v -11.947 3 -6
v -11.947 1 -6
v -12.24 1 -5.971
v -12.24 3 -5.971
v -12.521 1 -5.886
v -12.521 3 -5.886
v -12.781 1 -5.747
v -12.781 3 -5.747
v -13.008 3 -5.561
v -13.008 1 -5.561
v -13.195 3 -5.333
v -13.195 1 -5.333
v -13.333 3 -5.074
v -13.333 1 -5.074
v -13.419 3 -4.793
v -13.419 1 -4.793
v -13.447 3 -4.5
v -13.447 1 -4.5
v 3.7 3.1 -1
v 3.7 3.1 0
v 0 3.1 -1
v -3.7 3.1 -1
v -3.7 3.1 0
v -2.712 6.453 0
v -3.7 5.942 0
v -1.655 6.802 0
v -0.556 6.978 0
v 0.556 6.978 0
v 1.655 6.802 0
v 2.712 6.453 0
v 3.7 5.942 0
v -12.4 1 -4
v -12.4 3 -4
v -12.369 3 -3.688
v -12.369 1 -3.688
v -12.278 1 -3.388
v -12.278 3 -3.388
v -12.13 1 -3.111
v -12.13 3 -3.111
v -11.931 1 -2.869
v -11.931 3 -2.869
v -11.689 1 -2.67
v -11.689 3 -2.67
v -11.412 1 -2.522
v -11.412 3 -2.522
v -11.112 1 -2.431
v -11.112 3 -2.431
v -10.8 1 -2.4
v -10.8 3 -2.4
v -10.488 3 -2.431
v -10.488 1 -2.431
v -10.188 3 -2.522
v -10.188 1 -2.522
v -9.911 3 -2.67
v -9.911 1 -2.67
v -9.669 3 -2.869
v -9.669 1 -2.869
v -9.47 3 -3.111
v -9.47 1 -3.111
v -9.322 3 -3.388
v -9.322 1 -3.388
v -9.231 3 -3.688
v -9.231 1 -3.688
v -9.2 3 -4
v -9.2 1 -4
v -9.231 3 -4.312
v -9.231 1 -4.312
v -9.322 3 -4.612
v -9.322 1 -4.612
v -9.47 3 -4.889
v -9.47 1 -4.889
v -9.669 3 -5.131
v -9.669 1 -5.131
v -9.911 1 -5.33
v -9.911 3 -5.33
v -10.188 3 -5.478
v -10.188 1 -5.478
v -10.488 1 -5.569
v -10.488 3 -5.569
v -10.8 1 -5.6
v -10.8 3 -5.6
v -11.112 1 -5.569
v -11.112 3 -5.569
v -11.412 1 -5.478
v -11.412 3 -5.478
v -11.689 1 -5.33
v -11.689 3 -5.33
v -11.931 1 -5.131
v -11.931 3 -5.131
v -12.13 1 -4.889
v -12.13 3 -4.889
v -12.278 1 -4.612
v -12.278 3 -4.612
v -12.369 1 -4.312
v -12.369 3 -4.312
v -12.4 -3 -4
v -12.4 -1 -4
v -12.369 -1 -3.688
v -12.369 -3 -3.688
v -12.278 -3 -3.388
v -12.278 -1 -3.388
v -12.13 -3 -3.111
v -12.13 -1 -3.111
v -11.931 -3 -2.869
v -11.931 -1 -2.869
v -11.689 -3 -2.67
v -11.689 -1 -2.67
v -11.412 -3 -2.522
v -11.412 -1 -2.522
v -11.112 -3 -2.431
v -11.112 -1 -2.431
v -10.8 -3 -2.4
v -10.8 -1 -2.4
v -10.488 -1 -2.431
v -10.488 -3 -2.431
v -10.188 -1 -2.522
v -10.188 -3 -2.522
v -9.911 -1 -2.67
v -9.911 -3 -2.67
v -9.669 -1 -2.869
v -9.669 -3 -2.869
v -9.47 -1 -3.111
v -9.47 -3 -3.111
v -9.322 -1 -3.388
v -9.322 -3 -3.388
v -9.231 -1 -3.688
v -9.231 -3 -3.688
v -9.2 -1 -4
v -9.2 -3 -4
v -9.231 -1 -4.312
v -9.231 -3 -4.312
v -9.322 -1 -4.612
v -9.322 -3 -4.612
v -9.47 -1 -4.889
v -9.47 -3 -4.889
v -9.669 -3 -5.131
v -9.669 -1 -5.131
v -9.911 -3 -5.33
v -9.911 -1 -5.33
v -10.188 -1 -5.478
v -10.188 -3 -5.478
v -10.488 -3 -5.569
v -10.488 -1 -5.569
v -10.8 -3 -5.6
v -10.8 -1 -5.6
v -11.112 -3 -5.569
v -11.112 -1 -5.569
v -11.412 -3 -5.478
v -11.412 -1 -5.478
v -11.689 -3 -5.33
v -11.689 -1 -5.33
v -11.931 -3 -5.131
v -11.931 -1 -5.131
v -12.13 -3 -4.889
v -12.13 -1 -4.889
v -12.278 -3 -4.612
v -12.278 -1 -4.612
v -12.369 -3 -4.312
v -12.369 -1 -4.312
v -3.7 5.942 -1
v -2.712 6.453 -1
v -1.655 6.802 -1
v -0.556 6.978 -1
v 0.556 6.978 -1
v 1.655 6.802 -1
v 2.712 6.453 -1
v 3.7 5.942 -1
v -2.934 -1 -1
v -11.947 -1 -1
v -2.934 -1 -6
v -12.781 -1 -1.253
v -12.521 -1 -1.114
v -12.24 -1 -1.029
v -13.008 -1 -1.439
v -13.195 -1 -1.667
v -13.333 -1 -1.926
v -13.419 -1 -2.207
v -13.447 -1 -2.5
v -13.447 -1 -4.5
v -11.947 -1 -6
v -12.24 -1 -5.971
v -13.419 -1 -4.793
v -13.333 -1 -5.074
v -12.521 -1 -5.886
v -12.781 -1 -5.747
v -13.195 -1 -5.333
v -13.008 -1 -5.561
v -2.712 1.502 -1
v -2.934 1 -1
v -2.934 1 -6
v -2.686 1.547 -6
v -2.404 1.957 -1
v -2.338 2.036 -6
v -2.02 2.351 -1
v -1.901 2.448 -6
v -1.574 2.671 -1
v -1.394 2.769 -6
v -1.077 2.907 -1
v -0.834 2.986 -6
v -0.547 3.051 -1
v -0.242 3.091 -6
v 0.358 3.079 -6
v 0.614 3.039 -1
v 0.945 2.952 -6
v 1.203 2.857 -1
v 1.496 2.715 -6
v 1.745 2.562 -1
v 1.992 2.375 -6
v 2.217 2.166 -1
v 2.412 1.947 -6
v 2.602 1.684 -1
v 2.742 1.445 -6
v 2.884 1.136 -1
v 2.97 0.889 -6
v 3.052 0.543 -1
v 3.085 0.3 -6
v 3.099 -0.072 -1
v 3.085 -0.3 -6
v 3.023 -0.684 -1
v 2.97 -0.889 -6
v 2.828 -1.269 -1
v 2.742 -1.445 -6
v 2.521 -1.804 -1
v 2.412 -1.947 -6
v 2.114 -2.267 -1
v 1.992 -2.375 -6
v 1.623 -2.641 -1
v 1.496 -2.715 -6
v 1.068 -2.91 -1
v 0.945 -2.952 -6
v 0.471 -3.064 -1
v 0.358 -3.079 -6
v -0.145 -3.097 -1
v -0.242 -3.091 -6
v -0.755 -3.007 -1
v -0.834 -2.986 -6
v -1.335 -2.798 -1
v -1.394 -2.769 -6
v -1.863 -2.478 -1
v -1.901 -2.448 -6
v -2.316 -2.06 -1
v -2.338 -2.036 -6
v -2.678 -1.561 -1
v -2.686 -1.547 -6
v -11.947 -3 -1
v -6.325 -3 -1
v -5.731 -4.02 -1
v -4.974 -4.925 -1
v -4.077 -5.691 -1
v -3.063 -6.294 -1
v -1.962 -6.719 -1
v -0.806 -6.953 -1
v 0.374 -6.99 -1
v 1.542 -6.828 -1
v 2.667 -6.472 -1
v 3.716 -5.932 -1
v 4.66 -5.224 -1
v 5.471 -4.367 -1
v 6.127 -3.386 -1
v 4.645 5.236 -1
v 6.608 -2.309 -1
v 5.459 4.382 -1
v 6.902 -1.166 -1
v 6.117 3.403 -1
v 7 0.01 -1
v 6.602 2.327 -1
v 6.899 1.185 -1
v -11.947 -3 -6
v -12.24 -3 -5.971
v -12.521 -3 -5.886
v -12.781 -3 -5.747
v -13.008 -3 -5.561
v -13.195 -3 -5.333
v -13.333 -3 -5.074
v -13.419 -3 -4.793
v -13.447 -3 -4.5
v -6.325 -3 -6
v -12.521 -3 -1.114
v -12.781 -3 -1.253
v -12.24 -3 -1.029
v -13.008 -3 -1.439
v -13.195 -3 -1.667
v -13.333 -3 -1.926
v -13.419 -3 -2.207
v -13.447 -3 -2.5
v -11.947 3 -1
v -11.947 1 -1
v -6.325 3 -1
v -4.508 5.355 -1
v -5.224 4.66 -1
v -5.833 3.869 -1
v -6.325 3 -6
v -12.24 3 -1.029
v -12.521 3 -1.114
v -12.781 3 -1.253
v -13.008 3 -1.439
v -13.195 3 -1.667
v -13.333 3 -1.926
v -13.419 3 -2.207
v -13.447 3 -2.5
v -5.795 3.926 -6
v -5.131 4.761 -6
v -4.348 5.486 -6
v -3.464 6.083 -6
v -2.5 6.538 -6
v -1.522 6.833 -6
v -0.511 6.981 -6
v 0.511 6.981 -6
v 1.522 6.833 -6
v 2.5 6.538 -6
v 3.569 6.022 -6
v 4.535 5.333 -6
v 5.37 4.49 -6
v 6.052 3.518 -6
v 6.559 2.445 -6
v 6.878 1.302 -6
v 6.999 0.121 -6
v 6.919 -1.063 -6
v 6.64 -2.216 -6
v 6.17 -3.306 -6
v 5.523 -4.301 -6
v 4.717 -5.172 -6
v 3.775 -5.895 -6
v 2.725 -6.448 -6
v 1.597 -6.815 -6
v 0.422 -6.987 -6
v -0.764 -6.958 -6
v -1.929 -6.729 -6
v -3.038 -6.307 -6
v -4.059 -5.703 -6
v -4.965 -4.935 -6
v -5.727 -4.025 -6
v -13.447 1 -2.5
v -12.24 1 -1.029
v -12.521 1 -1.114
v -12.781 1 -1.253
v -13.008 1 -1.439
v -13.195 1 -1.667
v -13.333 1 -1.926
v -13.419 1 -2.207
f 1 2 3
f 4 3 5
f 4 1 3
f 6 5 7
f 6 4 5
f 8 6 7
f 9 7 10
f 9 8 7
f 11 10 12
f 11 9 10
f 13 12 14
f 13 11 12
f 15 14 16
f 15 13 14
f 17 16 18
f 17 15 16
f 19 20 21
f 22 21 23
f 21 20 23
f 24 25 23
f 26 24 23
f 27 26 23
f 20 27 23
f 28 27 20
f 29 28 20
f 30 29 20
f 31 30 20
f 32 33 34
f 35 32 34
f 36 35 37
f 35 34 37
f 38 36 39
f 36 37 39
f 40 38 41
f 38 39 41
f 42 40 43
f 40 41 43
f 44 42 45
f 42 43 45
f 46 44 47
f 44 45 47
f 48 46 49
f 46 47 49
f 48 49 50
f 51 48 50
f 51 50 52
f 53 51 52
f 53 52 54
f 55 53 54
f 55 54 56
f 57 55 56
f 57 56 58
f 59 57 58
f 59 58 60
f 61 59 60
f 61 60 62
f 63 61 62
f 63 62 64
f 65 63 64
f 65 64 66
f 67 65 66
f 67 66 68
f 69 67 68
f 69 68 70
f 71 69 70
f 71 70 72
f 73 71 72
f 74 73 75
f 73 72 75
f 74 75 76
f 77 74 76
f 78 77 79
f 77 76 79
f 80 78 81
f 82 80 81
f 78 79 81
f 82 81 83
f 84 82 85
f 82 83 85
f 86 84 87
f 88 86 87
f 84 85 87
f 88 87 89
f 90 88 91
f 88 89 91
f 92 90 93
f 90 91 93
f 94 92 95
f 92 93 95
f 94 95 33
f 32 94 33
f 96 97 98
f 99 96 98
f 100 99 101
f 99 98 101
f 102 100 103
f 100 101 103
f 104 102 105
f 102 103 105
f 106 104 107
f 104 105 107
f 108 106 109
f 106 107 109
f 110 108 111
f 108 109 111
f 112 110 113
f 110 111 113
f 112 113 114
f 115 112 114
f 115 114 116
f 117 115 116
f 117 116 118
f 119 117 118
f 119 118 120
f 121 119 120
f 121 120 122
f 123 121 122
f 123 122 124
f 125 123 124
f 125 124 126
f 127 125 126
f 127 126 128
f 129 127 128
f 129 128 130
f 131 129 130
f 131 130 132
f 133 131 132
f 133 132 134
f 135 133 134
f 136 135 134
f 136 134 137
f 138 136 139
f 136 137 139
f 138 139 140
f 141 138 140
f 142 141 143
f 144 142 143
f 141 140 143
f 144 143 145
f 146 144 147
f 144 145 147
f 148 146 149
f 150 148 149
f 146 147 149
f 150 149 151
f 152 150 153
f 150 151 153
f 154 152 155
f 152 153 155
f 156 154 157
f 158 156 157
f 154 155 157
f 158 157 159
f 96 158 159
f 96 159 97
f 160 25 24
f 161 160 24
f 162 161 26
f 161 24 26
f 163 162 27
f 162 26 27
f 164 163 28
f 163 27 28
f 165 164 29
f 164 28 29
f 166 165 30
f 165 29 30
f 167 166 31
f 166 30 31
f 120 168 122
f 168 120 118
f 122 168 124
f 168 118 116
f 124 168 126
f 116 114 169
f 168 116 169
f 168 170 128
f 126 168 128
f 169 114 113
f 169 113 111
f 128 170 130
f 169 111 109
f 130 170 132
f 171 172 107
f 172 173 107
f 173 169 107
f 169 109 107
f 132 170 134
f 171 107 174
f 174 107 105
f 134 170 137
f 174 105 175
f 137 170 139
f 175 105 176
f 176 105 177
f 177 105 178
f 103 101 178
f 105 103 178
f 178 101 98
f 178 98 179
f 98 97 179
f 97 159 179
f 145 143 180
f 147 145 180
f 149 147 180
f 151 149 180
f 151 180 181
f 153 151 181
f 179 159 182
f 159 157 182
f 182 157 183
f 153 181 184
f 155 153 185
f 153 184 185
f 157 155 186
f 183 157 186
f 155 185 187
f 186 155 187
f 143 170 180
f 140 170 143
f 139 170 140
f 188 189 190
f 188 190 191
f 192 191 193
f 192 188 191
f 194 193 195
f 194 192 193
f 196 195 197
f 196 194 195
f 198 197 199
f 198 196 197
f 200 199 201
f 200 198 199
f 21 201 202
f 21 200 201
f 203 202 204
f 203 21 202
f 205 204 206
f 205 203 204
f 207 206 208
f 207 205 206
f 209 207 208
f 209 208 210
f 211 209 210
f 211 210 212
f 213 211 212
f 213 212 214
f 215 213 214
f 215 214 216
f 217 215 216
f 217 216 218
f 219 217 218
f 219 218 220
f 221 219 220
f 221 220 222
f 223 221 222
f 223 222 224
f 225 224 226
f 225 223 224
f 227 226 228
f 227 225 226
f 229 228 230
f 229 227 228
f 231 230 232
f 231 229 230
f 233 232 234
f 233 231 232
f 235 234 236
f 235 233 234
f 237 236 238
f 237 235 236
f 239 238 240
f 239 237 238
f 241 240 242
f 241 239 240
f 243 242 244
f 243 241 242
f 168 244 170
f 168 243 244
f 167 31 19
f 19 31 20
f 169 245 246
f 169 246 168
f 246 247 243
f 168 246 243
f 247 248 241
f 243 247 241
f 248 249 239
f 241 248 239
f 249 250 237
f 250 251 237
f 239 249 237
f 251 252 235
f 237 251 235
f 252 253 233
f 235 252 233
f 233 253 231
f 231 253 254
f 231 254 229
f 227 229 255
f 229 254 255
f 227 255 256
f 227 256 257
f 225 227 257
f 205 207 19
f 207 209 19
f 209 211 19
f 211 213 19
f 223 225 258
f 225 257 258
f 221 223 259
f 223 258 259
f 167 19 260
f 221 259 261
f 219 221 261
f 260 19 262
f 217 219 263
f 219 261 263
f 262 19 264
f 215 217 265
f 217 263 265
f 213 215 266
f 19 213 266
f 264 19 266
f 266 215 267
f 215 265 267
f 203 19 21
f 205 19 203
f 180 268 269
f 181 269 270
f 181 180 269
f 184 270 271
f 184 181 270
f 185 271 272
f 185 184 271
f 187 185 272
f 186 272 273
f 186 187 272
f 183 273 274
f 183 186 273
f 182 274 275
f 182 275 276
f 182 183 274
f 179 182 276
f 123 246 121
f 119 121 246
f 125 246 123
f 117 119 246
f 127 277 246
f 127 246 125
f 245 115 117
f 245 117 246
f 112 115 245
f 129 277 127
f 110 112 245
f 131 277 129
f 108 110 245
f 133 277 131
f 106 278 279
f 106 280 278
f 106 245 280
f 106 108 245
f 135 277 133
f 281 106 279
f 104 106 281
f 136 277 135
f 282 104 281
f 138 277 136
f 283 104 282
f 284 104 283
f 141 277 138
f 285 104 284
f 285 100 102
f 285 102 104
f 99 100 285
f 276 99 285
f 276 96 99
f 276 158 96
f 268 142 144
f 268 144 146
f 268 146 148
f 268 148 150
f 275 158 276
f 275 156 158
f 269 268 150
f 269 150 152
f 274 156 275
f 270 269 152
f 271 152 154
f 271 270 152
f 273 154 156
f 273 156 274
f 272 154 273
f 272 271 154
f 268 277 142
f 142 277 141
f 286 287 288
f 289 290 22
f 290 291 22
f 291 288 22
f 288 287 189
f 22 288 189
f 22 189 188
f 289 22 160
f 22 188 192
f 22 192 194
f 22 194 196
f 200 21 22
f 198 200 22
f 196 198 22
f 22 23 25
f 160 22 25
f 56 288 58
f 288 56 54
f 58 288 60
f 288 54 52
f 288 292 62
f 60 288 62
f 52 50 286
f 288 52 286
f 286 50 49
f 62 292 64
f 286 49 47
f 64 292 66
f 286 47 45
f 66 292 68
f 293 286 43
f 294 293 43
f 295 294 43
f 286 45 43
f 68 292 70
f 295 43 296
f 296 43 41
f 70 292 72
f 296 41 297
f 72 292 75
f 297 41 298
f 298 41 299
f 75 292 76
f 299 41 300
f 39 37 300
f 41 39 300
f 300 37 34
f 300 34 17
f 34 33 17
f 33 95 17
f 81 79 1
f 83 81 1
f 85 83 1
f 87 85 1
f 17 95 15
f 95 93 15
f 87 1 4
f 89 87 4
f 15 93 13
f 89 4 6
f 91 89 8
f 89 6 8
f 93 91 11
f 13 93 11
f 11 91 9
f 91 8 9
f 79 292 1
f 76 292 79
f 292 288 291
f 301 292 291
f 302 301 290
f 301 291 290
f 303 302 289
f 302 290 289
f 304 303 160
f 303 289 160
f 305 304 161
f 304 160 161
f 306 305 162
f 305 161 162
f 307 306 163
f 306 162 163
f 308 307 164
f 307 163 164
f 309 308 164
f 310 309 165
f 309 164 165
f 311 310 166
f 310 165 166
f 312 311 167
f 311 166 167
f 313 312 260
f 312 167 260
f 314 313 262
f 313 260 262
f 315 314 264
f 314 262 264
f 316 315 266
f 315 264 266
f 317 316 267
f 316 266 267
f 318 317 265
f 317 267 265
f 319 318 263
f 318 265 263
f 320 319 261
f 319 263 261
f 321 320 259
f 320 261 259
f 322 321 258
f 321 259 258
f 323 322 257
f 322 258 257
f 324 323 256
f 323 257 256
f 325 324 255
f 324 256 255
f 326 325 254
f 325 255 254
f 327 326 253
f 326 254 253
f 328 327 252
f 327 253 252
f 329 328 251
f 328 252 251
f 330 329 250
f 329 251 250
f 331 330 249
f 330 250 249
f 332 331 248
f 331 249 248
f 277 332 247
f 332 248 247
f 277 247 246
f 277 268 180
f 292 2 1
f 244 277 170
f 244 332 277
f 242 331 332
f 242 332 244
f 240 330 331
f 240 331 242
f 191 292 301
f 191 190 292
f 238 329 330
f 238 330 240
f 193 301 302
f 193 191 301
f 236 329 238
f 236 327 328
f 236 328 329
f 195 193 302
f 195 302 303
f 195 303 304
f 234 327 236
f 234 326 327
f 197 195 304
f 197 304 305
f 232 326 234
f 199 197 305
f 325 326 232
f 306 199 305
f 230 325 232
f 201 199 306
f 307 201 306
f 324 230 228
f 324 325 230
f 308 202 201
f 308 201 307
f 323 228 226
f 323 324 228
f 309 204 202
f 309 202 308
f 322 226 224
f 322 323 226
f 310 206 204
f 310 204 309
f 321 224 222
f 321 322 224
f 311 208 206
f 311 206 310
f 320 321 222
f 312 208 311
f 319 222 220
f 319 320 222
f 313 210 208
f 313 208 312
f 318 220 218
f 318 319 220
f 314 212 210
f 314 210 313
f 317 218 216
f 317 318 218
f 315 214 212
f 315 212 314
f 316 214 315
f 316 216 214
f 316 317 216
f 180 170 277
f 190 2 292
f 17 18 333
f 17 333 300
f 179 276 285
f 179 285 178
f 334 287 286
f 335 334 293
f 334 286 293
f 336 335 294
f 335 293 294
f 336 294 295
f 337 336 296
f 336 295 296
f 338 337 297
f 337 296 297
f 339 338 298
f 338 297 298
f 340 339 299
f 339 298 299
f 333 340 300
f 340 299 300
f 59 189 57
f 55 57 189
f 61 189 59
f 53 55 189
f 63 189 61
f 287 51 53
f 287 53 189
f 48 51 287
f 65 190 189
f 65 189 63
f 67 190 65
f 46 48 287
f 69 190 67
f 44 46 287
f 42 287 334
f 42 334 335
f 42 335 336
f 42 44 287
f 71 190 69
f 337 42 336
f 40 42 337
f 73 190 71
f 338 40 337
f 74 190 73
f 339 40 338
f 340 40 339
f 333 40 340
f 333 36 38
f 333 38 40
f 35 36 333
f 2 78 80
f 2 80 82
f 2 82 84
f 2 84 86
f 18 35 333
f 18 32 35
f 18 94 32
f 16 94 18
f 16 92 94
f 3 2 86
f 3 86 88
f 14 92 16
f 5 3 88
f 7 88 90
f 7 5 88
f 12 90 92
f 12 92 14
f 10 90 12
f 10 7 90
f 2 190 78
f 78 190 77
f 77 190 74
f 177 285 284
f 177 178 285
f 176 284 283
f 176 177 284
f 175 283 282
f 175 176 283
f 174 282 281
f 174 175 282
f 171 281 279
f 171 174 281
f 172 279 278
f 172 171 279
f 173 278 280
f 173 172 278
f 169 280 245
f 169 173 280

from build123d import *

# Parameters (mm, degrees)
SKETCH_1_R          = 14
SKETCH_1_R_2        = 1.5
EXTRUDE_1_DEPTH     = 2
CUT_EXTRUDE_1_DEPTH = 20.899748742
EXTRUDE_4_DEPTH     = 1
SKETCH_6_R          = 7
SKETCH_6_R_2        = 3.1
EXTRUDE_5_DEPTH     = 5
EXTRUDE_6_DEPTH     = 1
SKETCH_8_W          = 8
SKETCH_8_H          = 2
EXTRUDE_7_DEPTH     = 5
SKETCH_9_R          = 1.6
CUT_EXTRUDE_3_DEPTH = 24.108440017
EXTRUDE_8_DEPTH     = 2
SKETCH_11_W         = 12.041493288
SKETCH_11_H         = 2
CUT_EXTRUDE_4_DEPTH = 5
SKETCH_12_R         = 20
SKETCH_12_R_2       = 3.1
EXTRUDE_9_DEPTH     = 2
SKETCH_13_R         = 2.3
CUT_EXTRUDE_5_DEPTH = 2
CUT_EXTRUDE_START   = -1
CUT_EXTRUDE_6_DEPTH = 1
FILLET_1_R          = 3
FILLET_2_R          = 1.5
SKETCH_15_R         = 20
CUT_EXTRUDE_7_DEPTH = 2
SKETCH_16_R         = 7
CUT_EXTRUDE_8_DEPTH = 5


with BuildPart() as part:
    # 草图1 → 凸台-拉伸1 (new body)
    with BuildSketch(Plane.XY):
        Circle(SKETCH_1_R)
        with Locations((-7.071067812, 7.071067812)):
            Circle(SKETCH_1_R_2, mode=Mode.SUBTRACT)
        with Locations((7.071067812, 7.071067812)):
            Circle(SKETCH_1_R_2, mode=Mode.SUBTRACT)
        with Locations((-7.071067812, -7.071067812)):
            Circle(SKETCH_1_R_2, mode=Mode.SUBTRACT)
        with Locations((7.071067812, -7.071067812)):
            Circle(SKETCH_1_R_2, mode=Mode.SUBTRACT)
    extrude(amount=EXTRUDE_1_DEPTH)

    # 草图2 → 切除-拉伸1 (cut, through all)
    with BuildSketch(Plane(origin=(0, 0, 0), x_dir=(-1, 0, 0), z_dir=(0, 0, -1))):
        with BuildLine():
            ThreePointArc((-2.683281573, 3.1), (-4.1, 0), (-2.683281573, -3.1))
            Line((-2.683281573, -3.1), (2.683281573, -3.1))
            ThreePointArc((2.683281573, -3.1), (4.1, 0), (2.683281573, 3.1))
            Line((2.683281573, 3.1), (-2.683281573, 3.1))
        make_face()
    extrude(amount=-CUT_EXTRUDE_1_DEPTH, mode=Mode.SUBTRACT)

    # 草图3 → 凸台-拉伸4 (add)
    with BuildSketch(Plane(origin=(0, 0, 0), x_dir=(-1, 0, 0), z_dir=(0, 0, -1))):
        Polygon((0, 3.1), (3.7, 3.1), (3.7, 7.1), (-3.7, 7.1), (-3.7, 3.1), align=None)
    extrude(amount=EXTRUDE_4_DEPTH)

    # 草图6 → 凸台-拉伸5 (add)
    with BuildSketch(Plane(origin=(0, 0, -1), x_dir=(-1, 0, 0), z_dir=(0, 0, -1))):
        with Locations(Location((0, 0, 0), (0, 0, 121.908982735))):
            Circle(SKETCH_6_R)
        with Locations(Location((0, 0, 0), (0, 0, 90))):
            Circle(SKETCH_6_R_2, mode=Mode.SUBTRACT)
    extrude(amount=EXTRUDE_5_DEPTH)

    # 草图7 → 凸台-拉伸6 (add)
    with BuildSketch(Plane(origin=(0, 0, -6), x_dir=(-1, 0, 0), z_dir=(0, 0, -1))):
        with BuildLine():
            Line((-2.5, 3.1), (-2.5, 6.538348415))
            ThreePointArc((-2.5, 6.538348415), (0, 7), (2.5, 6.538348415))
            Line((2.5, 6.538348415), (2.5, 3.1))
            Line((2.5, 3.1), (-2.5, 3.1))
        make_face()
    extrude(amount=EXTRUDE_6_DEPTH)

    # 草图8 → 凸台-拉伸7 (add)
    with BuildSketch(Plane(origin=(0, 0, -6), x_dir=(-1, 0, 0), z_dir=(0, 0, -1))):
        with Locations((9.447401339, 2)):
            Rectangle(SKETCH_8_W, SKETCH_8_H)
        with Locations((9.447401339, -2)):
            Rectangle(SKETCH_8_W, SKETCH_8_H)
    extrude(amount=-EXTRUDE_7_DEPTH)

    # 草图9 → 切除-拉伸3 (cut, through all)
    with BuildSketch(Plane(origin=(0, 3, 0), x_dir=(1, 0, 0), z_dir=(0, 1, 0))):
        with Locations(Location((-10.8, 4, 0), (0, 0, 180))):
            Circle(SKETCH_9_R)
    extrude(amount=-CUT_EXTRUDE_3_DEPTH, mode=Mode.SUBTRACT)

    # 草图10 → 凸台-拉伸8 (add)
    with BuildSketch(Plane(origin=(0, 0, -7), x_dir=(-1, 0, 0), z_dir=(0, 0, -1))):
        with BuildLine():
            Line((-2.5, 6.538348415), (-2.5, 3.1))
            ThreePointArc((-2.5, 3.1), (0, -3.98246155), (2.5, 3.1))
            Line((2.5, 3.1), (2.5, 6.538348415))
            ThreePointArc((2.5, 6.538348415), (0, 7), (-2.5, 6.538348415))
        make_face()
    extrude(amount=EXTRUDE_8_DEPTH)

    # 草图11 → 切除-拉伸4 (cut)
    with BuildSketch(Plane(origin=(0, 0, -6), x_dir=(-1, 0, 0), z_dir=(0, 0, -1))):
        with Locations((7.426654695, 0)):
            Rectangle(SKETCH_11_W, SKETCH_11_H)
    extrude(amount=-CUT_EXTRUDE_4_DEPTH, mode=Mode.SUBTRACT)

    # 草图12 → 凸台-拉伸9 (add)
    with BuildSketch(Plane.XY.offset(2)):
        Circle(SKETCH_12_R)
        Circle(SKETCH_12_R_2, mode=Mode.SUBTRACT)
    extrude(amount=-EXTRUDE_9_DEPTH)

    # 草图13 → 切除-拉伸5 (cut)
    with BuildSketch(Plane.XY.offset(2)):
        with Locations((10.253048327, 10.253048327)):
            Circle(SKETCH_13_R)
        with Locations((-10.253048327, 10.253048327)):
            Circle(SKETCH_13_R)
        with Locations((-10.253048327, -10.253048327)):
            Circle(SKETCH_13_R)
        with Locations((10.253048327, -10.253048327)):
            Circle(SKETCH_13_R)
    extrude(amount=-CUT_EXTRUDE_5_DEPTH, mode=Mode.SUBTRACT)

    # 草图14 → 切除-拉伸6 (cut)
    with BuildSketch(Plane(origin=(0, 0, -1), x_dir=(-1, 0, 0), z_dir=(0, 0, -1)).offset(CUT_EXTRUDE_START)):
        with BuildLine():
            Line((-4.590882623, 5.284297185), (-4.590882623, 9.738638689))
            Line((-4.590882623, 9.738638689), (4.724825977, 9.738638689))
            Line((4.724825977, 9.738638689), (4.724825977, 5.164883298))
            ThreePointArc((4.724825977, 5.164883298), (0.089722487, 6.999424967), (-4.590882623, 5.284297185))
        make_face()
    extrude(amount=CUT_EXTRUDE_6_DEPTH, mode=Mode.SUBTRACT)

    # 圆角1
    fillet_1_edges = [part.edges().sort_by_distance(p)[0] for p in [
        (0, 7, -9),
    ]]
    fillet(fillet_1_edges, radius=FILLET_1_R)

    # 圆角2
    fillet_2_edges = [part.edges().sort_by_distance(p)[0] for p in [
        (-13.447401339, -2, -1),
        (-13.447401339, -2, -6),
        (-13.447401339, 2, -1),
        (-13.447401339, 2, -6),
    ]]
    fillet(fillet_2_edges, radius=FILLET_2_R)

    # 草图15 → 切除-拉伸7 (cut)
    with BuildSketch(Plane.XY.offset(2)):
        Circle(SKETCH_15_R)
    extrude(amount=-CUT_EXTRUDE_7_DEPTH, mode=Mode.SUBTRACT)

    # 草图16 → 切除-拉伸8 (cut)
    with BuildSketch(Plane(origin=(0, 0, -6), x_dir=(-1, 0, 0), z_dir=(0, 0, -1))):
        Circle(SKETCH_16_R)
    extrude(amount=CUT_EXTRUDE_8_DEPTH, mode=Mode.SUBTRACT)


solid = part.part
